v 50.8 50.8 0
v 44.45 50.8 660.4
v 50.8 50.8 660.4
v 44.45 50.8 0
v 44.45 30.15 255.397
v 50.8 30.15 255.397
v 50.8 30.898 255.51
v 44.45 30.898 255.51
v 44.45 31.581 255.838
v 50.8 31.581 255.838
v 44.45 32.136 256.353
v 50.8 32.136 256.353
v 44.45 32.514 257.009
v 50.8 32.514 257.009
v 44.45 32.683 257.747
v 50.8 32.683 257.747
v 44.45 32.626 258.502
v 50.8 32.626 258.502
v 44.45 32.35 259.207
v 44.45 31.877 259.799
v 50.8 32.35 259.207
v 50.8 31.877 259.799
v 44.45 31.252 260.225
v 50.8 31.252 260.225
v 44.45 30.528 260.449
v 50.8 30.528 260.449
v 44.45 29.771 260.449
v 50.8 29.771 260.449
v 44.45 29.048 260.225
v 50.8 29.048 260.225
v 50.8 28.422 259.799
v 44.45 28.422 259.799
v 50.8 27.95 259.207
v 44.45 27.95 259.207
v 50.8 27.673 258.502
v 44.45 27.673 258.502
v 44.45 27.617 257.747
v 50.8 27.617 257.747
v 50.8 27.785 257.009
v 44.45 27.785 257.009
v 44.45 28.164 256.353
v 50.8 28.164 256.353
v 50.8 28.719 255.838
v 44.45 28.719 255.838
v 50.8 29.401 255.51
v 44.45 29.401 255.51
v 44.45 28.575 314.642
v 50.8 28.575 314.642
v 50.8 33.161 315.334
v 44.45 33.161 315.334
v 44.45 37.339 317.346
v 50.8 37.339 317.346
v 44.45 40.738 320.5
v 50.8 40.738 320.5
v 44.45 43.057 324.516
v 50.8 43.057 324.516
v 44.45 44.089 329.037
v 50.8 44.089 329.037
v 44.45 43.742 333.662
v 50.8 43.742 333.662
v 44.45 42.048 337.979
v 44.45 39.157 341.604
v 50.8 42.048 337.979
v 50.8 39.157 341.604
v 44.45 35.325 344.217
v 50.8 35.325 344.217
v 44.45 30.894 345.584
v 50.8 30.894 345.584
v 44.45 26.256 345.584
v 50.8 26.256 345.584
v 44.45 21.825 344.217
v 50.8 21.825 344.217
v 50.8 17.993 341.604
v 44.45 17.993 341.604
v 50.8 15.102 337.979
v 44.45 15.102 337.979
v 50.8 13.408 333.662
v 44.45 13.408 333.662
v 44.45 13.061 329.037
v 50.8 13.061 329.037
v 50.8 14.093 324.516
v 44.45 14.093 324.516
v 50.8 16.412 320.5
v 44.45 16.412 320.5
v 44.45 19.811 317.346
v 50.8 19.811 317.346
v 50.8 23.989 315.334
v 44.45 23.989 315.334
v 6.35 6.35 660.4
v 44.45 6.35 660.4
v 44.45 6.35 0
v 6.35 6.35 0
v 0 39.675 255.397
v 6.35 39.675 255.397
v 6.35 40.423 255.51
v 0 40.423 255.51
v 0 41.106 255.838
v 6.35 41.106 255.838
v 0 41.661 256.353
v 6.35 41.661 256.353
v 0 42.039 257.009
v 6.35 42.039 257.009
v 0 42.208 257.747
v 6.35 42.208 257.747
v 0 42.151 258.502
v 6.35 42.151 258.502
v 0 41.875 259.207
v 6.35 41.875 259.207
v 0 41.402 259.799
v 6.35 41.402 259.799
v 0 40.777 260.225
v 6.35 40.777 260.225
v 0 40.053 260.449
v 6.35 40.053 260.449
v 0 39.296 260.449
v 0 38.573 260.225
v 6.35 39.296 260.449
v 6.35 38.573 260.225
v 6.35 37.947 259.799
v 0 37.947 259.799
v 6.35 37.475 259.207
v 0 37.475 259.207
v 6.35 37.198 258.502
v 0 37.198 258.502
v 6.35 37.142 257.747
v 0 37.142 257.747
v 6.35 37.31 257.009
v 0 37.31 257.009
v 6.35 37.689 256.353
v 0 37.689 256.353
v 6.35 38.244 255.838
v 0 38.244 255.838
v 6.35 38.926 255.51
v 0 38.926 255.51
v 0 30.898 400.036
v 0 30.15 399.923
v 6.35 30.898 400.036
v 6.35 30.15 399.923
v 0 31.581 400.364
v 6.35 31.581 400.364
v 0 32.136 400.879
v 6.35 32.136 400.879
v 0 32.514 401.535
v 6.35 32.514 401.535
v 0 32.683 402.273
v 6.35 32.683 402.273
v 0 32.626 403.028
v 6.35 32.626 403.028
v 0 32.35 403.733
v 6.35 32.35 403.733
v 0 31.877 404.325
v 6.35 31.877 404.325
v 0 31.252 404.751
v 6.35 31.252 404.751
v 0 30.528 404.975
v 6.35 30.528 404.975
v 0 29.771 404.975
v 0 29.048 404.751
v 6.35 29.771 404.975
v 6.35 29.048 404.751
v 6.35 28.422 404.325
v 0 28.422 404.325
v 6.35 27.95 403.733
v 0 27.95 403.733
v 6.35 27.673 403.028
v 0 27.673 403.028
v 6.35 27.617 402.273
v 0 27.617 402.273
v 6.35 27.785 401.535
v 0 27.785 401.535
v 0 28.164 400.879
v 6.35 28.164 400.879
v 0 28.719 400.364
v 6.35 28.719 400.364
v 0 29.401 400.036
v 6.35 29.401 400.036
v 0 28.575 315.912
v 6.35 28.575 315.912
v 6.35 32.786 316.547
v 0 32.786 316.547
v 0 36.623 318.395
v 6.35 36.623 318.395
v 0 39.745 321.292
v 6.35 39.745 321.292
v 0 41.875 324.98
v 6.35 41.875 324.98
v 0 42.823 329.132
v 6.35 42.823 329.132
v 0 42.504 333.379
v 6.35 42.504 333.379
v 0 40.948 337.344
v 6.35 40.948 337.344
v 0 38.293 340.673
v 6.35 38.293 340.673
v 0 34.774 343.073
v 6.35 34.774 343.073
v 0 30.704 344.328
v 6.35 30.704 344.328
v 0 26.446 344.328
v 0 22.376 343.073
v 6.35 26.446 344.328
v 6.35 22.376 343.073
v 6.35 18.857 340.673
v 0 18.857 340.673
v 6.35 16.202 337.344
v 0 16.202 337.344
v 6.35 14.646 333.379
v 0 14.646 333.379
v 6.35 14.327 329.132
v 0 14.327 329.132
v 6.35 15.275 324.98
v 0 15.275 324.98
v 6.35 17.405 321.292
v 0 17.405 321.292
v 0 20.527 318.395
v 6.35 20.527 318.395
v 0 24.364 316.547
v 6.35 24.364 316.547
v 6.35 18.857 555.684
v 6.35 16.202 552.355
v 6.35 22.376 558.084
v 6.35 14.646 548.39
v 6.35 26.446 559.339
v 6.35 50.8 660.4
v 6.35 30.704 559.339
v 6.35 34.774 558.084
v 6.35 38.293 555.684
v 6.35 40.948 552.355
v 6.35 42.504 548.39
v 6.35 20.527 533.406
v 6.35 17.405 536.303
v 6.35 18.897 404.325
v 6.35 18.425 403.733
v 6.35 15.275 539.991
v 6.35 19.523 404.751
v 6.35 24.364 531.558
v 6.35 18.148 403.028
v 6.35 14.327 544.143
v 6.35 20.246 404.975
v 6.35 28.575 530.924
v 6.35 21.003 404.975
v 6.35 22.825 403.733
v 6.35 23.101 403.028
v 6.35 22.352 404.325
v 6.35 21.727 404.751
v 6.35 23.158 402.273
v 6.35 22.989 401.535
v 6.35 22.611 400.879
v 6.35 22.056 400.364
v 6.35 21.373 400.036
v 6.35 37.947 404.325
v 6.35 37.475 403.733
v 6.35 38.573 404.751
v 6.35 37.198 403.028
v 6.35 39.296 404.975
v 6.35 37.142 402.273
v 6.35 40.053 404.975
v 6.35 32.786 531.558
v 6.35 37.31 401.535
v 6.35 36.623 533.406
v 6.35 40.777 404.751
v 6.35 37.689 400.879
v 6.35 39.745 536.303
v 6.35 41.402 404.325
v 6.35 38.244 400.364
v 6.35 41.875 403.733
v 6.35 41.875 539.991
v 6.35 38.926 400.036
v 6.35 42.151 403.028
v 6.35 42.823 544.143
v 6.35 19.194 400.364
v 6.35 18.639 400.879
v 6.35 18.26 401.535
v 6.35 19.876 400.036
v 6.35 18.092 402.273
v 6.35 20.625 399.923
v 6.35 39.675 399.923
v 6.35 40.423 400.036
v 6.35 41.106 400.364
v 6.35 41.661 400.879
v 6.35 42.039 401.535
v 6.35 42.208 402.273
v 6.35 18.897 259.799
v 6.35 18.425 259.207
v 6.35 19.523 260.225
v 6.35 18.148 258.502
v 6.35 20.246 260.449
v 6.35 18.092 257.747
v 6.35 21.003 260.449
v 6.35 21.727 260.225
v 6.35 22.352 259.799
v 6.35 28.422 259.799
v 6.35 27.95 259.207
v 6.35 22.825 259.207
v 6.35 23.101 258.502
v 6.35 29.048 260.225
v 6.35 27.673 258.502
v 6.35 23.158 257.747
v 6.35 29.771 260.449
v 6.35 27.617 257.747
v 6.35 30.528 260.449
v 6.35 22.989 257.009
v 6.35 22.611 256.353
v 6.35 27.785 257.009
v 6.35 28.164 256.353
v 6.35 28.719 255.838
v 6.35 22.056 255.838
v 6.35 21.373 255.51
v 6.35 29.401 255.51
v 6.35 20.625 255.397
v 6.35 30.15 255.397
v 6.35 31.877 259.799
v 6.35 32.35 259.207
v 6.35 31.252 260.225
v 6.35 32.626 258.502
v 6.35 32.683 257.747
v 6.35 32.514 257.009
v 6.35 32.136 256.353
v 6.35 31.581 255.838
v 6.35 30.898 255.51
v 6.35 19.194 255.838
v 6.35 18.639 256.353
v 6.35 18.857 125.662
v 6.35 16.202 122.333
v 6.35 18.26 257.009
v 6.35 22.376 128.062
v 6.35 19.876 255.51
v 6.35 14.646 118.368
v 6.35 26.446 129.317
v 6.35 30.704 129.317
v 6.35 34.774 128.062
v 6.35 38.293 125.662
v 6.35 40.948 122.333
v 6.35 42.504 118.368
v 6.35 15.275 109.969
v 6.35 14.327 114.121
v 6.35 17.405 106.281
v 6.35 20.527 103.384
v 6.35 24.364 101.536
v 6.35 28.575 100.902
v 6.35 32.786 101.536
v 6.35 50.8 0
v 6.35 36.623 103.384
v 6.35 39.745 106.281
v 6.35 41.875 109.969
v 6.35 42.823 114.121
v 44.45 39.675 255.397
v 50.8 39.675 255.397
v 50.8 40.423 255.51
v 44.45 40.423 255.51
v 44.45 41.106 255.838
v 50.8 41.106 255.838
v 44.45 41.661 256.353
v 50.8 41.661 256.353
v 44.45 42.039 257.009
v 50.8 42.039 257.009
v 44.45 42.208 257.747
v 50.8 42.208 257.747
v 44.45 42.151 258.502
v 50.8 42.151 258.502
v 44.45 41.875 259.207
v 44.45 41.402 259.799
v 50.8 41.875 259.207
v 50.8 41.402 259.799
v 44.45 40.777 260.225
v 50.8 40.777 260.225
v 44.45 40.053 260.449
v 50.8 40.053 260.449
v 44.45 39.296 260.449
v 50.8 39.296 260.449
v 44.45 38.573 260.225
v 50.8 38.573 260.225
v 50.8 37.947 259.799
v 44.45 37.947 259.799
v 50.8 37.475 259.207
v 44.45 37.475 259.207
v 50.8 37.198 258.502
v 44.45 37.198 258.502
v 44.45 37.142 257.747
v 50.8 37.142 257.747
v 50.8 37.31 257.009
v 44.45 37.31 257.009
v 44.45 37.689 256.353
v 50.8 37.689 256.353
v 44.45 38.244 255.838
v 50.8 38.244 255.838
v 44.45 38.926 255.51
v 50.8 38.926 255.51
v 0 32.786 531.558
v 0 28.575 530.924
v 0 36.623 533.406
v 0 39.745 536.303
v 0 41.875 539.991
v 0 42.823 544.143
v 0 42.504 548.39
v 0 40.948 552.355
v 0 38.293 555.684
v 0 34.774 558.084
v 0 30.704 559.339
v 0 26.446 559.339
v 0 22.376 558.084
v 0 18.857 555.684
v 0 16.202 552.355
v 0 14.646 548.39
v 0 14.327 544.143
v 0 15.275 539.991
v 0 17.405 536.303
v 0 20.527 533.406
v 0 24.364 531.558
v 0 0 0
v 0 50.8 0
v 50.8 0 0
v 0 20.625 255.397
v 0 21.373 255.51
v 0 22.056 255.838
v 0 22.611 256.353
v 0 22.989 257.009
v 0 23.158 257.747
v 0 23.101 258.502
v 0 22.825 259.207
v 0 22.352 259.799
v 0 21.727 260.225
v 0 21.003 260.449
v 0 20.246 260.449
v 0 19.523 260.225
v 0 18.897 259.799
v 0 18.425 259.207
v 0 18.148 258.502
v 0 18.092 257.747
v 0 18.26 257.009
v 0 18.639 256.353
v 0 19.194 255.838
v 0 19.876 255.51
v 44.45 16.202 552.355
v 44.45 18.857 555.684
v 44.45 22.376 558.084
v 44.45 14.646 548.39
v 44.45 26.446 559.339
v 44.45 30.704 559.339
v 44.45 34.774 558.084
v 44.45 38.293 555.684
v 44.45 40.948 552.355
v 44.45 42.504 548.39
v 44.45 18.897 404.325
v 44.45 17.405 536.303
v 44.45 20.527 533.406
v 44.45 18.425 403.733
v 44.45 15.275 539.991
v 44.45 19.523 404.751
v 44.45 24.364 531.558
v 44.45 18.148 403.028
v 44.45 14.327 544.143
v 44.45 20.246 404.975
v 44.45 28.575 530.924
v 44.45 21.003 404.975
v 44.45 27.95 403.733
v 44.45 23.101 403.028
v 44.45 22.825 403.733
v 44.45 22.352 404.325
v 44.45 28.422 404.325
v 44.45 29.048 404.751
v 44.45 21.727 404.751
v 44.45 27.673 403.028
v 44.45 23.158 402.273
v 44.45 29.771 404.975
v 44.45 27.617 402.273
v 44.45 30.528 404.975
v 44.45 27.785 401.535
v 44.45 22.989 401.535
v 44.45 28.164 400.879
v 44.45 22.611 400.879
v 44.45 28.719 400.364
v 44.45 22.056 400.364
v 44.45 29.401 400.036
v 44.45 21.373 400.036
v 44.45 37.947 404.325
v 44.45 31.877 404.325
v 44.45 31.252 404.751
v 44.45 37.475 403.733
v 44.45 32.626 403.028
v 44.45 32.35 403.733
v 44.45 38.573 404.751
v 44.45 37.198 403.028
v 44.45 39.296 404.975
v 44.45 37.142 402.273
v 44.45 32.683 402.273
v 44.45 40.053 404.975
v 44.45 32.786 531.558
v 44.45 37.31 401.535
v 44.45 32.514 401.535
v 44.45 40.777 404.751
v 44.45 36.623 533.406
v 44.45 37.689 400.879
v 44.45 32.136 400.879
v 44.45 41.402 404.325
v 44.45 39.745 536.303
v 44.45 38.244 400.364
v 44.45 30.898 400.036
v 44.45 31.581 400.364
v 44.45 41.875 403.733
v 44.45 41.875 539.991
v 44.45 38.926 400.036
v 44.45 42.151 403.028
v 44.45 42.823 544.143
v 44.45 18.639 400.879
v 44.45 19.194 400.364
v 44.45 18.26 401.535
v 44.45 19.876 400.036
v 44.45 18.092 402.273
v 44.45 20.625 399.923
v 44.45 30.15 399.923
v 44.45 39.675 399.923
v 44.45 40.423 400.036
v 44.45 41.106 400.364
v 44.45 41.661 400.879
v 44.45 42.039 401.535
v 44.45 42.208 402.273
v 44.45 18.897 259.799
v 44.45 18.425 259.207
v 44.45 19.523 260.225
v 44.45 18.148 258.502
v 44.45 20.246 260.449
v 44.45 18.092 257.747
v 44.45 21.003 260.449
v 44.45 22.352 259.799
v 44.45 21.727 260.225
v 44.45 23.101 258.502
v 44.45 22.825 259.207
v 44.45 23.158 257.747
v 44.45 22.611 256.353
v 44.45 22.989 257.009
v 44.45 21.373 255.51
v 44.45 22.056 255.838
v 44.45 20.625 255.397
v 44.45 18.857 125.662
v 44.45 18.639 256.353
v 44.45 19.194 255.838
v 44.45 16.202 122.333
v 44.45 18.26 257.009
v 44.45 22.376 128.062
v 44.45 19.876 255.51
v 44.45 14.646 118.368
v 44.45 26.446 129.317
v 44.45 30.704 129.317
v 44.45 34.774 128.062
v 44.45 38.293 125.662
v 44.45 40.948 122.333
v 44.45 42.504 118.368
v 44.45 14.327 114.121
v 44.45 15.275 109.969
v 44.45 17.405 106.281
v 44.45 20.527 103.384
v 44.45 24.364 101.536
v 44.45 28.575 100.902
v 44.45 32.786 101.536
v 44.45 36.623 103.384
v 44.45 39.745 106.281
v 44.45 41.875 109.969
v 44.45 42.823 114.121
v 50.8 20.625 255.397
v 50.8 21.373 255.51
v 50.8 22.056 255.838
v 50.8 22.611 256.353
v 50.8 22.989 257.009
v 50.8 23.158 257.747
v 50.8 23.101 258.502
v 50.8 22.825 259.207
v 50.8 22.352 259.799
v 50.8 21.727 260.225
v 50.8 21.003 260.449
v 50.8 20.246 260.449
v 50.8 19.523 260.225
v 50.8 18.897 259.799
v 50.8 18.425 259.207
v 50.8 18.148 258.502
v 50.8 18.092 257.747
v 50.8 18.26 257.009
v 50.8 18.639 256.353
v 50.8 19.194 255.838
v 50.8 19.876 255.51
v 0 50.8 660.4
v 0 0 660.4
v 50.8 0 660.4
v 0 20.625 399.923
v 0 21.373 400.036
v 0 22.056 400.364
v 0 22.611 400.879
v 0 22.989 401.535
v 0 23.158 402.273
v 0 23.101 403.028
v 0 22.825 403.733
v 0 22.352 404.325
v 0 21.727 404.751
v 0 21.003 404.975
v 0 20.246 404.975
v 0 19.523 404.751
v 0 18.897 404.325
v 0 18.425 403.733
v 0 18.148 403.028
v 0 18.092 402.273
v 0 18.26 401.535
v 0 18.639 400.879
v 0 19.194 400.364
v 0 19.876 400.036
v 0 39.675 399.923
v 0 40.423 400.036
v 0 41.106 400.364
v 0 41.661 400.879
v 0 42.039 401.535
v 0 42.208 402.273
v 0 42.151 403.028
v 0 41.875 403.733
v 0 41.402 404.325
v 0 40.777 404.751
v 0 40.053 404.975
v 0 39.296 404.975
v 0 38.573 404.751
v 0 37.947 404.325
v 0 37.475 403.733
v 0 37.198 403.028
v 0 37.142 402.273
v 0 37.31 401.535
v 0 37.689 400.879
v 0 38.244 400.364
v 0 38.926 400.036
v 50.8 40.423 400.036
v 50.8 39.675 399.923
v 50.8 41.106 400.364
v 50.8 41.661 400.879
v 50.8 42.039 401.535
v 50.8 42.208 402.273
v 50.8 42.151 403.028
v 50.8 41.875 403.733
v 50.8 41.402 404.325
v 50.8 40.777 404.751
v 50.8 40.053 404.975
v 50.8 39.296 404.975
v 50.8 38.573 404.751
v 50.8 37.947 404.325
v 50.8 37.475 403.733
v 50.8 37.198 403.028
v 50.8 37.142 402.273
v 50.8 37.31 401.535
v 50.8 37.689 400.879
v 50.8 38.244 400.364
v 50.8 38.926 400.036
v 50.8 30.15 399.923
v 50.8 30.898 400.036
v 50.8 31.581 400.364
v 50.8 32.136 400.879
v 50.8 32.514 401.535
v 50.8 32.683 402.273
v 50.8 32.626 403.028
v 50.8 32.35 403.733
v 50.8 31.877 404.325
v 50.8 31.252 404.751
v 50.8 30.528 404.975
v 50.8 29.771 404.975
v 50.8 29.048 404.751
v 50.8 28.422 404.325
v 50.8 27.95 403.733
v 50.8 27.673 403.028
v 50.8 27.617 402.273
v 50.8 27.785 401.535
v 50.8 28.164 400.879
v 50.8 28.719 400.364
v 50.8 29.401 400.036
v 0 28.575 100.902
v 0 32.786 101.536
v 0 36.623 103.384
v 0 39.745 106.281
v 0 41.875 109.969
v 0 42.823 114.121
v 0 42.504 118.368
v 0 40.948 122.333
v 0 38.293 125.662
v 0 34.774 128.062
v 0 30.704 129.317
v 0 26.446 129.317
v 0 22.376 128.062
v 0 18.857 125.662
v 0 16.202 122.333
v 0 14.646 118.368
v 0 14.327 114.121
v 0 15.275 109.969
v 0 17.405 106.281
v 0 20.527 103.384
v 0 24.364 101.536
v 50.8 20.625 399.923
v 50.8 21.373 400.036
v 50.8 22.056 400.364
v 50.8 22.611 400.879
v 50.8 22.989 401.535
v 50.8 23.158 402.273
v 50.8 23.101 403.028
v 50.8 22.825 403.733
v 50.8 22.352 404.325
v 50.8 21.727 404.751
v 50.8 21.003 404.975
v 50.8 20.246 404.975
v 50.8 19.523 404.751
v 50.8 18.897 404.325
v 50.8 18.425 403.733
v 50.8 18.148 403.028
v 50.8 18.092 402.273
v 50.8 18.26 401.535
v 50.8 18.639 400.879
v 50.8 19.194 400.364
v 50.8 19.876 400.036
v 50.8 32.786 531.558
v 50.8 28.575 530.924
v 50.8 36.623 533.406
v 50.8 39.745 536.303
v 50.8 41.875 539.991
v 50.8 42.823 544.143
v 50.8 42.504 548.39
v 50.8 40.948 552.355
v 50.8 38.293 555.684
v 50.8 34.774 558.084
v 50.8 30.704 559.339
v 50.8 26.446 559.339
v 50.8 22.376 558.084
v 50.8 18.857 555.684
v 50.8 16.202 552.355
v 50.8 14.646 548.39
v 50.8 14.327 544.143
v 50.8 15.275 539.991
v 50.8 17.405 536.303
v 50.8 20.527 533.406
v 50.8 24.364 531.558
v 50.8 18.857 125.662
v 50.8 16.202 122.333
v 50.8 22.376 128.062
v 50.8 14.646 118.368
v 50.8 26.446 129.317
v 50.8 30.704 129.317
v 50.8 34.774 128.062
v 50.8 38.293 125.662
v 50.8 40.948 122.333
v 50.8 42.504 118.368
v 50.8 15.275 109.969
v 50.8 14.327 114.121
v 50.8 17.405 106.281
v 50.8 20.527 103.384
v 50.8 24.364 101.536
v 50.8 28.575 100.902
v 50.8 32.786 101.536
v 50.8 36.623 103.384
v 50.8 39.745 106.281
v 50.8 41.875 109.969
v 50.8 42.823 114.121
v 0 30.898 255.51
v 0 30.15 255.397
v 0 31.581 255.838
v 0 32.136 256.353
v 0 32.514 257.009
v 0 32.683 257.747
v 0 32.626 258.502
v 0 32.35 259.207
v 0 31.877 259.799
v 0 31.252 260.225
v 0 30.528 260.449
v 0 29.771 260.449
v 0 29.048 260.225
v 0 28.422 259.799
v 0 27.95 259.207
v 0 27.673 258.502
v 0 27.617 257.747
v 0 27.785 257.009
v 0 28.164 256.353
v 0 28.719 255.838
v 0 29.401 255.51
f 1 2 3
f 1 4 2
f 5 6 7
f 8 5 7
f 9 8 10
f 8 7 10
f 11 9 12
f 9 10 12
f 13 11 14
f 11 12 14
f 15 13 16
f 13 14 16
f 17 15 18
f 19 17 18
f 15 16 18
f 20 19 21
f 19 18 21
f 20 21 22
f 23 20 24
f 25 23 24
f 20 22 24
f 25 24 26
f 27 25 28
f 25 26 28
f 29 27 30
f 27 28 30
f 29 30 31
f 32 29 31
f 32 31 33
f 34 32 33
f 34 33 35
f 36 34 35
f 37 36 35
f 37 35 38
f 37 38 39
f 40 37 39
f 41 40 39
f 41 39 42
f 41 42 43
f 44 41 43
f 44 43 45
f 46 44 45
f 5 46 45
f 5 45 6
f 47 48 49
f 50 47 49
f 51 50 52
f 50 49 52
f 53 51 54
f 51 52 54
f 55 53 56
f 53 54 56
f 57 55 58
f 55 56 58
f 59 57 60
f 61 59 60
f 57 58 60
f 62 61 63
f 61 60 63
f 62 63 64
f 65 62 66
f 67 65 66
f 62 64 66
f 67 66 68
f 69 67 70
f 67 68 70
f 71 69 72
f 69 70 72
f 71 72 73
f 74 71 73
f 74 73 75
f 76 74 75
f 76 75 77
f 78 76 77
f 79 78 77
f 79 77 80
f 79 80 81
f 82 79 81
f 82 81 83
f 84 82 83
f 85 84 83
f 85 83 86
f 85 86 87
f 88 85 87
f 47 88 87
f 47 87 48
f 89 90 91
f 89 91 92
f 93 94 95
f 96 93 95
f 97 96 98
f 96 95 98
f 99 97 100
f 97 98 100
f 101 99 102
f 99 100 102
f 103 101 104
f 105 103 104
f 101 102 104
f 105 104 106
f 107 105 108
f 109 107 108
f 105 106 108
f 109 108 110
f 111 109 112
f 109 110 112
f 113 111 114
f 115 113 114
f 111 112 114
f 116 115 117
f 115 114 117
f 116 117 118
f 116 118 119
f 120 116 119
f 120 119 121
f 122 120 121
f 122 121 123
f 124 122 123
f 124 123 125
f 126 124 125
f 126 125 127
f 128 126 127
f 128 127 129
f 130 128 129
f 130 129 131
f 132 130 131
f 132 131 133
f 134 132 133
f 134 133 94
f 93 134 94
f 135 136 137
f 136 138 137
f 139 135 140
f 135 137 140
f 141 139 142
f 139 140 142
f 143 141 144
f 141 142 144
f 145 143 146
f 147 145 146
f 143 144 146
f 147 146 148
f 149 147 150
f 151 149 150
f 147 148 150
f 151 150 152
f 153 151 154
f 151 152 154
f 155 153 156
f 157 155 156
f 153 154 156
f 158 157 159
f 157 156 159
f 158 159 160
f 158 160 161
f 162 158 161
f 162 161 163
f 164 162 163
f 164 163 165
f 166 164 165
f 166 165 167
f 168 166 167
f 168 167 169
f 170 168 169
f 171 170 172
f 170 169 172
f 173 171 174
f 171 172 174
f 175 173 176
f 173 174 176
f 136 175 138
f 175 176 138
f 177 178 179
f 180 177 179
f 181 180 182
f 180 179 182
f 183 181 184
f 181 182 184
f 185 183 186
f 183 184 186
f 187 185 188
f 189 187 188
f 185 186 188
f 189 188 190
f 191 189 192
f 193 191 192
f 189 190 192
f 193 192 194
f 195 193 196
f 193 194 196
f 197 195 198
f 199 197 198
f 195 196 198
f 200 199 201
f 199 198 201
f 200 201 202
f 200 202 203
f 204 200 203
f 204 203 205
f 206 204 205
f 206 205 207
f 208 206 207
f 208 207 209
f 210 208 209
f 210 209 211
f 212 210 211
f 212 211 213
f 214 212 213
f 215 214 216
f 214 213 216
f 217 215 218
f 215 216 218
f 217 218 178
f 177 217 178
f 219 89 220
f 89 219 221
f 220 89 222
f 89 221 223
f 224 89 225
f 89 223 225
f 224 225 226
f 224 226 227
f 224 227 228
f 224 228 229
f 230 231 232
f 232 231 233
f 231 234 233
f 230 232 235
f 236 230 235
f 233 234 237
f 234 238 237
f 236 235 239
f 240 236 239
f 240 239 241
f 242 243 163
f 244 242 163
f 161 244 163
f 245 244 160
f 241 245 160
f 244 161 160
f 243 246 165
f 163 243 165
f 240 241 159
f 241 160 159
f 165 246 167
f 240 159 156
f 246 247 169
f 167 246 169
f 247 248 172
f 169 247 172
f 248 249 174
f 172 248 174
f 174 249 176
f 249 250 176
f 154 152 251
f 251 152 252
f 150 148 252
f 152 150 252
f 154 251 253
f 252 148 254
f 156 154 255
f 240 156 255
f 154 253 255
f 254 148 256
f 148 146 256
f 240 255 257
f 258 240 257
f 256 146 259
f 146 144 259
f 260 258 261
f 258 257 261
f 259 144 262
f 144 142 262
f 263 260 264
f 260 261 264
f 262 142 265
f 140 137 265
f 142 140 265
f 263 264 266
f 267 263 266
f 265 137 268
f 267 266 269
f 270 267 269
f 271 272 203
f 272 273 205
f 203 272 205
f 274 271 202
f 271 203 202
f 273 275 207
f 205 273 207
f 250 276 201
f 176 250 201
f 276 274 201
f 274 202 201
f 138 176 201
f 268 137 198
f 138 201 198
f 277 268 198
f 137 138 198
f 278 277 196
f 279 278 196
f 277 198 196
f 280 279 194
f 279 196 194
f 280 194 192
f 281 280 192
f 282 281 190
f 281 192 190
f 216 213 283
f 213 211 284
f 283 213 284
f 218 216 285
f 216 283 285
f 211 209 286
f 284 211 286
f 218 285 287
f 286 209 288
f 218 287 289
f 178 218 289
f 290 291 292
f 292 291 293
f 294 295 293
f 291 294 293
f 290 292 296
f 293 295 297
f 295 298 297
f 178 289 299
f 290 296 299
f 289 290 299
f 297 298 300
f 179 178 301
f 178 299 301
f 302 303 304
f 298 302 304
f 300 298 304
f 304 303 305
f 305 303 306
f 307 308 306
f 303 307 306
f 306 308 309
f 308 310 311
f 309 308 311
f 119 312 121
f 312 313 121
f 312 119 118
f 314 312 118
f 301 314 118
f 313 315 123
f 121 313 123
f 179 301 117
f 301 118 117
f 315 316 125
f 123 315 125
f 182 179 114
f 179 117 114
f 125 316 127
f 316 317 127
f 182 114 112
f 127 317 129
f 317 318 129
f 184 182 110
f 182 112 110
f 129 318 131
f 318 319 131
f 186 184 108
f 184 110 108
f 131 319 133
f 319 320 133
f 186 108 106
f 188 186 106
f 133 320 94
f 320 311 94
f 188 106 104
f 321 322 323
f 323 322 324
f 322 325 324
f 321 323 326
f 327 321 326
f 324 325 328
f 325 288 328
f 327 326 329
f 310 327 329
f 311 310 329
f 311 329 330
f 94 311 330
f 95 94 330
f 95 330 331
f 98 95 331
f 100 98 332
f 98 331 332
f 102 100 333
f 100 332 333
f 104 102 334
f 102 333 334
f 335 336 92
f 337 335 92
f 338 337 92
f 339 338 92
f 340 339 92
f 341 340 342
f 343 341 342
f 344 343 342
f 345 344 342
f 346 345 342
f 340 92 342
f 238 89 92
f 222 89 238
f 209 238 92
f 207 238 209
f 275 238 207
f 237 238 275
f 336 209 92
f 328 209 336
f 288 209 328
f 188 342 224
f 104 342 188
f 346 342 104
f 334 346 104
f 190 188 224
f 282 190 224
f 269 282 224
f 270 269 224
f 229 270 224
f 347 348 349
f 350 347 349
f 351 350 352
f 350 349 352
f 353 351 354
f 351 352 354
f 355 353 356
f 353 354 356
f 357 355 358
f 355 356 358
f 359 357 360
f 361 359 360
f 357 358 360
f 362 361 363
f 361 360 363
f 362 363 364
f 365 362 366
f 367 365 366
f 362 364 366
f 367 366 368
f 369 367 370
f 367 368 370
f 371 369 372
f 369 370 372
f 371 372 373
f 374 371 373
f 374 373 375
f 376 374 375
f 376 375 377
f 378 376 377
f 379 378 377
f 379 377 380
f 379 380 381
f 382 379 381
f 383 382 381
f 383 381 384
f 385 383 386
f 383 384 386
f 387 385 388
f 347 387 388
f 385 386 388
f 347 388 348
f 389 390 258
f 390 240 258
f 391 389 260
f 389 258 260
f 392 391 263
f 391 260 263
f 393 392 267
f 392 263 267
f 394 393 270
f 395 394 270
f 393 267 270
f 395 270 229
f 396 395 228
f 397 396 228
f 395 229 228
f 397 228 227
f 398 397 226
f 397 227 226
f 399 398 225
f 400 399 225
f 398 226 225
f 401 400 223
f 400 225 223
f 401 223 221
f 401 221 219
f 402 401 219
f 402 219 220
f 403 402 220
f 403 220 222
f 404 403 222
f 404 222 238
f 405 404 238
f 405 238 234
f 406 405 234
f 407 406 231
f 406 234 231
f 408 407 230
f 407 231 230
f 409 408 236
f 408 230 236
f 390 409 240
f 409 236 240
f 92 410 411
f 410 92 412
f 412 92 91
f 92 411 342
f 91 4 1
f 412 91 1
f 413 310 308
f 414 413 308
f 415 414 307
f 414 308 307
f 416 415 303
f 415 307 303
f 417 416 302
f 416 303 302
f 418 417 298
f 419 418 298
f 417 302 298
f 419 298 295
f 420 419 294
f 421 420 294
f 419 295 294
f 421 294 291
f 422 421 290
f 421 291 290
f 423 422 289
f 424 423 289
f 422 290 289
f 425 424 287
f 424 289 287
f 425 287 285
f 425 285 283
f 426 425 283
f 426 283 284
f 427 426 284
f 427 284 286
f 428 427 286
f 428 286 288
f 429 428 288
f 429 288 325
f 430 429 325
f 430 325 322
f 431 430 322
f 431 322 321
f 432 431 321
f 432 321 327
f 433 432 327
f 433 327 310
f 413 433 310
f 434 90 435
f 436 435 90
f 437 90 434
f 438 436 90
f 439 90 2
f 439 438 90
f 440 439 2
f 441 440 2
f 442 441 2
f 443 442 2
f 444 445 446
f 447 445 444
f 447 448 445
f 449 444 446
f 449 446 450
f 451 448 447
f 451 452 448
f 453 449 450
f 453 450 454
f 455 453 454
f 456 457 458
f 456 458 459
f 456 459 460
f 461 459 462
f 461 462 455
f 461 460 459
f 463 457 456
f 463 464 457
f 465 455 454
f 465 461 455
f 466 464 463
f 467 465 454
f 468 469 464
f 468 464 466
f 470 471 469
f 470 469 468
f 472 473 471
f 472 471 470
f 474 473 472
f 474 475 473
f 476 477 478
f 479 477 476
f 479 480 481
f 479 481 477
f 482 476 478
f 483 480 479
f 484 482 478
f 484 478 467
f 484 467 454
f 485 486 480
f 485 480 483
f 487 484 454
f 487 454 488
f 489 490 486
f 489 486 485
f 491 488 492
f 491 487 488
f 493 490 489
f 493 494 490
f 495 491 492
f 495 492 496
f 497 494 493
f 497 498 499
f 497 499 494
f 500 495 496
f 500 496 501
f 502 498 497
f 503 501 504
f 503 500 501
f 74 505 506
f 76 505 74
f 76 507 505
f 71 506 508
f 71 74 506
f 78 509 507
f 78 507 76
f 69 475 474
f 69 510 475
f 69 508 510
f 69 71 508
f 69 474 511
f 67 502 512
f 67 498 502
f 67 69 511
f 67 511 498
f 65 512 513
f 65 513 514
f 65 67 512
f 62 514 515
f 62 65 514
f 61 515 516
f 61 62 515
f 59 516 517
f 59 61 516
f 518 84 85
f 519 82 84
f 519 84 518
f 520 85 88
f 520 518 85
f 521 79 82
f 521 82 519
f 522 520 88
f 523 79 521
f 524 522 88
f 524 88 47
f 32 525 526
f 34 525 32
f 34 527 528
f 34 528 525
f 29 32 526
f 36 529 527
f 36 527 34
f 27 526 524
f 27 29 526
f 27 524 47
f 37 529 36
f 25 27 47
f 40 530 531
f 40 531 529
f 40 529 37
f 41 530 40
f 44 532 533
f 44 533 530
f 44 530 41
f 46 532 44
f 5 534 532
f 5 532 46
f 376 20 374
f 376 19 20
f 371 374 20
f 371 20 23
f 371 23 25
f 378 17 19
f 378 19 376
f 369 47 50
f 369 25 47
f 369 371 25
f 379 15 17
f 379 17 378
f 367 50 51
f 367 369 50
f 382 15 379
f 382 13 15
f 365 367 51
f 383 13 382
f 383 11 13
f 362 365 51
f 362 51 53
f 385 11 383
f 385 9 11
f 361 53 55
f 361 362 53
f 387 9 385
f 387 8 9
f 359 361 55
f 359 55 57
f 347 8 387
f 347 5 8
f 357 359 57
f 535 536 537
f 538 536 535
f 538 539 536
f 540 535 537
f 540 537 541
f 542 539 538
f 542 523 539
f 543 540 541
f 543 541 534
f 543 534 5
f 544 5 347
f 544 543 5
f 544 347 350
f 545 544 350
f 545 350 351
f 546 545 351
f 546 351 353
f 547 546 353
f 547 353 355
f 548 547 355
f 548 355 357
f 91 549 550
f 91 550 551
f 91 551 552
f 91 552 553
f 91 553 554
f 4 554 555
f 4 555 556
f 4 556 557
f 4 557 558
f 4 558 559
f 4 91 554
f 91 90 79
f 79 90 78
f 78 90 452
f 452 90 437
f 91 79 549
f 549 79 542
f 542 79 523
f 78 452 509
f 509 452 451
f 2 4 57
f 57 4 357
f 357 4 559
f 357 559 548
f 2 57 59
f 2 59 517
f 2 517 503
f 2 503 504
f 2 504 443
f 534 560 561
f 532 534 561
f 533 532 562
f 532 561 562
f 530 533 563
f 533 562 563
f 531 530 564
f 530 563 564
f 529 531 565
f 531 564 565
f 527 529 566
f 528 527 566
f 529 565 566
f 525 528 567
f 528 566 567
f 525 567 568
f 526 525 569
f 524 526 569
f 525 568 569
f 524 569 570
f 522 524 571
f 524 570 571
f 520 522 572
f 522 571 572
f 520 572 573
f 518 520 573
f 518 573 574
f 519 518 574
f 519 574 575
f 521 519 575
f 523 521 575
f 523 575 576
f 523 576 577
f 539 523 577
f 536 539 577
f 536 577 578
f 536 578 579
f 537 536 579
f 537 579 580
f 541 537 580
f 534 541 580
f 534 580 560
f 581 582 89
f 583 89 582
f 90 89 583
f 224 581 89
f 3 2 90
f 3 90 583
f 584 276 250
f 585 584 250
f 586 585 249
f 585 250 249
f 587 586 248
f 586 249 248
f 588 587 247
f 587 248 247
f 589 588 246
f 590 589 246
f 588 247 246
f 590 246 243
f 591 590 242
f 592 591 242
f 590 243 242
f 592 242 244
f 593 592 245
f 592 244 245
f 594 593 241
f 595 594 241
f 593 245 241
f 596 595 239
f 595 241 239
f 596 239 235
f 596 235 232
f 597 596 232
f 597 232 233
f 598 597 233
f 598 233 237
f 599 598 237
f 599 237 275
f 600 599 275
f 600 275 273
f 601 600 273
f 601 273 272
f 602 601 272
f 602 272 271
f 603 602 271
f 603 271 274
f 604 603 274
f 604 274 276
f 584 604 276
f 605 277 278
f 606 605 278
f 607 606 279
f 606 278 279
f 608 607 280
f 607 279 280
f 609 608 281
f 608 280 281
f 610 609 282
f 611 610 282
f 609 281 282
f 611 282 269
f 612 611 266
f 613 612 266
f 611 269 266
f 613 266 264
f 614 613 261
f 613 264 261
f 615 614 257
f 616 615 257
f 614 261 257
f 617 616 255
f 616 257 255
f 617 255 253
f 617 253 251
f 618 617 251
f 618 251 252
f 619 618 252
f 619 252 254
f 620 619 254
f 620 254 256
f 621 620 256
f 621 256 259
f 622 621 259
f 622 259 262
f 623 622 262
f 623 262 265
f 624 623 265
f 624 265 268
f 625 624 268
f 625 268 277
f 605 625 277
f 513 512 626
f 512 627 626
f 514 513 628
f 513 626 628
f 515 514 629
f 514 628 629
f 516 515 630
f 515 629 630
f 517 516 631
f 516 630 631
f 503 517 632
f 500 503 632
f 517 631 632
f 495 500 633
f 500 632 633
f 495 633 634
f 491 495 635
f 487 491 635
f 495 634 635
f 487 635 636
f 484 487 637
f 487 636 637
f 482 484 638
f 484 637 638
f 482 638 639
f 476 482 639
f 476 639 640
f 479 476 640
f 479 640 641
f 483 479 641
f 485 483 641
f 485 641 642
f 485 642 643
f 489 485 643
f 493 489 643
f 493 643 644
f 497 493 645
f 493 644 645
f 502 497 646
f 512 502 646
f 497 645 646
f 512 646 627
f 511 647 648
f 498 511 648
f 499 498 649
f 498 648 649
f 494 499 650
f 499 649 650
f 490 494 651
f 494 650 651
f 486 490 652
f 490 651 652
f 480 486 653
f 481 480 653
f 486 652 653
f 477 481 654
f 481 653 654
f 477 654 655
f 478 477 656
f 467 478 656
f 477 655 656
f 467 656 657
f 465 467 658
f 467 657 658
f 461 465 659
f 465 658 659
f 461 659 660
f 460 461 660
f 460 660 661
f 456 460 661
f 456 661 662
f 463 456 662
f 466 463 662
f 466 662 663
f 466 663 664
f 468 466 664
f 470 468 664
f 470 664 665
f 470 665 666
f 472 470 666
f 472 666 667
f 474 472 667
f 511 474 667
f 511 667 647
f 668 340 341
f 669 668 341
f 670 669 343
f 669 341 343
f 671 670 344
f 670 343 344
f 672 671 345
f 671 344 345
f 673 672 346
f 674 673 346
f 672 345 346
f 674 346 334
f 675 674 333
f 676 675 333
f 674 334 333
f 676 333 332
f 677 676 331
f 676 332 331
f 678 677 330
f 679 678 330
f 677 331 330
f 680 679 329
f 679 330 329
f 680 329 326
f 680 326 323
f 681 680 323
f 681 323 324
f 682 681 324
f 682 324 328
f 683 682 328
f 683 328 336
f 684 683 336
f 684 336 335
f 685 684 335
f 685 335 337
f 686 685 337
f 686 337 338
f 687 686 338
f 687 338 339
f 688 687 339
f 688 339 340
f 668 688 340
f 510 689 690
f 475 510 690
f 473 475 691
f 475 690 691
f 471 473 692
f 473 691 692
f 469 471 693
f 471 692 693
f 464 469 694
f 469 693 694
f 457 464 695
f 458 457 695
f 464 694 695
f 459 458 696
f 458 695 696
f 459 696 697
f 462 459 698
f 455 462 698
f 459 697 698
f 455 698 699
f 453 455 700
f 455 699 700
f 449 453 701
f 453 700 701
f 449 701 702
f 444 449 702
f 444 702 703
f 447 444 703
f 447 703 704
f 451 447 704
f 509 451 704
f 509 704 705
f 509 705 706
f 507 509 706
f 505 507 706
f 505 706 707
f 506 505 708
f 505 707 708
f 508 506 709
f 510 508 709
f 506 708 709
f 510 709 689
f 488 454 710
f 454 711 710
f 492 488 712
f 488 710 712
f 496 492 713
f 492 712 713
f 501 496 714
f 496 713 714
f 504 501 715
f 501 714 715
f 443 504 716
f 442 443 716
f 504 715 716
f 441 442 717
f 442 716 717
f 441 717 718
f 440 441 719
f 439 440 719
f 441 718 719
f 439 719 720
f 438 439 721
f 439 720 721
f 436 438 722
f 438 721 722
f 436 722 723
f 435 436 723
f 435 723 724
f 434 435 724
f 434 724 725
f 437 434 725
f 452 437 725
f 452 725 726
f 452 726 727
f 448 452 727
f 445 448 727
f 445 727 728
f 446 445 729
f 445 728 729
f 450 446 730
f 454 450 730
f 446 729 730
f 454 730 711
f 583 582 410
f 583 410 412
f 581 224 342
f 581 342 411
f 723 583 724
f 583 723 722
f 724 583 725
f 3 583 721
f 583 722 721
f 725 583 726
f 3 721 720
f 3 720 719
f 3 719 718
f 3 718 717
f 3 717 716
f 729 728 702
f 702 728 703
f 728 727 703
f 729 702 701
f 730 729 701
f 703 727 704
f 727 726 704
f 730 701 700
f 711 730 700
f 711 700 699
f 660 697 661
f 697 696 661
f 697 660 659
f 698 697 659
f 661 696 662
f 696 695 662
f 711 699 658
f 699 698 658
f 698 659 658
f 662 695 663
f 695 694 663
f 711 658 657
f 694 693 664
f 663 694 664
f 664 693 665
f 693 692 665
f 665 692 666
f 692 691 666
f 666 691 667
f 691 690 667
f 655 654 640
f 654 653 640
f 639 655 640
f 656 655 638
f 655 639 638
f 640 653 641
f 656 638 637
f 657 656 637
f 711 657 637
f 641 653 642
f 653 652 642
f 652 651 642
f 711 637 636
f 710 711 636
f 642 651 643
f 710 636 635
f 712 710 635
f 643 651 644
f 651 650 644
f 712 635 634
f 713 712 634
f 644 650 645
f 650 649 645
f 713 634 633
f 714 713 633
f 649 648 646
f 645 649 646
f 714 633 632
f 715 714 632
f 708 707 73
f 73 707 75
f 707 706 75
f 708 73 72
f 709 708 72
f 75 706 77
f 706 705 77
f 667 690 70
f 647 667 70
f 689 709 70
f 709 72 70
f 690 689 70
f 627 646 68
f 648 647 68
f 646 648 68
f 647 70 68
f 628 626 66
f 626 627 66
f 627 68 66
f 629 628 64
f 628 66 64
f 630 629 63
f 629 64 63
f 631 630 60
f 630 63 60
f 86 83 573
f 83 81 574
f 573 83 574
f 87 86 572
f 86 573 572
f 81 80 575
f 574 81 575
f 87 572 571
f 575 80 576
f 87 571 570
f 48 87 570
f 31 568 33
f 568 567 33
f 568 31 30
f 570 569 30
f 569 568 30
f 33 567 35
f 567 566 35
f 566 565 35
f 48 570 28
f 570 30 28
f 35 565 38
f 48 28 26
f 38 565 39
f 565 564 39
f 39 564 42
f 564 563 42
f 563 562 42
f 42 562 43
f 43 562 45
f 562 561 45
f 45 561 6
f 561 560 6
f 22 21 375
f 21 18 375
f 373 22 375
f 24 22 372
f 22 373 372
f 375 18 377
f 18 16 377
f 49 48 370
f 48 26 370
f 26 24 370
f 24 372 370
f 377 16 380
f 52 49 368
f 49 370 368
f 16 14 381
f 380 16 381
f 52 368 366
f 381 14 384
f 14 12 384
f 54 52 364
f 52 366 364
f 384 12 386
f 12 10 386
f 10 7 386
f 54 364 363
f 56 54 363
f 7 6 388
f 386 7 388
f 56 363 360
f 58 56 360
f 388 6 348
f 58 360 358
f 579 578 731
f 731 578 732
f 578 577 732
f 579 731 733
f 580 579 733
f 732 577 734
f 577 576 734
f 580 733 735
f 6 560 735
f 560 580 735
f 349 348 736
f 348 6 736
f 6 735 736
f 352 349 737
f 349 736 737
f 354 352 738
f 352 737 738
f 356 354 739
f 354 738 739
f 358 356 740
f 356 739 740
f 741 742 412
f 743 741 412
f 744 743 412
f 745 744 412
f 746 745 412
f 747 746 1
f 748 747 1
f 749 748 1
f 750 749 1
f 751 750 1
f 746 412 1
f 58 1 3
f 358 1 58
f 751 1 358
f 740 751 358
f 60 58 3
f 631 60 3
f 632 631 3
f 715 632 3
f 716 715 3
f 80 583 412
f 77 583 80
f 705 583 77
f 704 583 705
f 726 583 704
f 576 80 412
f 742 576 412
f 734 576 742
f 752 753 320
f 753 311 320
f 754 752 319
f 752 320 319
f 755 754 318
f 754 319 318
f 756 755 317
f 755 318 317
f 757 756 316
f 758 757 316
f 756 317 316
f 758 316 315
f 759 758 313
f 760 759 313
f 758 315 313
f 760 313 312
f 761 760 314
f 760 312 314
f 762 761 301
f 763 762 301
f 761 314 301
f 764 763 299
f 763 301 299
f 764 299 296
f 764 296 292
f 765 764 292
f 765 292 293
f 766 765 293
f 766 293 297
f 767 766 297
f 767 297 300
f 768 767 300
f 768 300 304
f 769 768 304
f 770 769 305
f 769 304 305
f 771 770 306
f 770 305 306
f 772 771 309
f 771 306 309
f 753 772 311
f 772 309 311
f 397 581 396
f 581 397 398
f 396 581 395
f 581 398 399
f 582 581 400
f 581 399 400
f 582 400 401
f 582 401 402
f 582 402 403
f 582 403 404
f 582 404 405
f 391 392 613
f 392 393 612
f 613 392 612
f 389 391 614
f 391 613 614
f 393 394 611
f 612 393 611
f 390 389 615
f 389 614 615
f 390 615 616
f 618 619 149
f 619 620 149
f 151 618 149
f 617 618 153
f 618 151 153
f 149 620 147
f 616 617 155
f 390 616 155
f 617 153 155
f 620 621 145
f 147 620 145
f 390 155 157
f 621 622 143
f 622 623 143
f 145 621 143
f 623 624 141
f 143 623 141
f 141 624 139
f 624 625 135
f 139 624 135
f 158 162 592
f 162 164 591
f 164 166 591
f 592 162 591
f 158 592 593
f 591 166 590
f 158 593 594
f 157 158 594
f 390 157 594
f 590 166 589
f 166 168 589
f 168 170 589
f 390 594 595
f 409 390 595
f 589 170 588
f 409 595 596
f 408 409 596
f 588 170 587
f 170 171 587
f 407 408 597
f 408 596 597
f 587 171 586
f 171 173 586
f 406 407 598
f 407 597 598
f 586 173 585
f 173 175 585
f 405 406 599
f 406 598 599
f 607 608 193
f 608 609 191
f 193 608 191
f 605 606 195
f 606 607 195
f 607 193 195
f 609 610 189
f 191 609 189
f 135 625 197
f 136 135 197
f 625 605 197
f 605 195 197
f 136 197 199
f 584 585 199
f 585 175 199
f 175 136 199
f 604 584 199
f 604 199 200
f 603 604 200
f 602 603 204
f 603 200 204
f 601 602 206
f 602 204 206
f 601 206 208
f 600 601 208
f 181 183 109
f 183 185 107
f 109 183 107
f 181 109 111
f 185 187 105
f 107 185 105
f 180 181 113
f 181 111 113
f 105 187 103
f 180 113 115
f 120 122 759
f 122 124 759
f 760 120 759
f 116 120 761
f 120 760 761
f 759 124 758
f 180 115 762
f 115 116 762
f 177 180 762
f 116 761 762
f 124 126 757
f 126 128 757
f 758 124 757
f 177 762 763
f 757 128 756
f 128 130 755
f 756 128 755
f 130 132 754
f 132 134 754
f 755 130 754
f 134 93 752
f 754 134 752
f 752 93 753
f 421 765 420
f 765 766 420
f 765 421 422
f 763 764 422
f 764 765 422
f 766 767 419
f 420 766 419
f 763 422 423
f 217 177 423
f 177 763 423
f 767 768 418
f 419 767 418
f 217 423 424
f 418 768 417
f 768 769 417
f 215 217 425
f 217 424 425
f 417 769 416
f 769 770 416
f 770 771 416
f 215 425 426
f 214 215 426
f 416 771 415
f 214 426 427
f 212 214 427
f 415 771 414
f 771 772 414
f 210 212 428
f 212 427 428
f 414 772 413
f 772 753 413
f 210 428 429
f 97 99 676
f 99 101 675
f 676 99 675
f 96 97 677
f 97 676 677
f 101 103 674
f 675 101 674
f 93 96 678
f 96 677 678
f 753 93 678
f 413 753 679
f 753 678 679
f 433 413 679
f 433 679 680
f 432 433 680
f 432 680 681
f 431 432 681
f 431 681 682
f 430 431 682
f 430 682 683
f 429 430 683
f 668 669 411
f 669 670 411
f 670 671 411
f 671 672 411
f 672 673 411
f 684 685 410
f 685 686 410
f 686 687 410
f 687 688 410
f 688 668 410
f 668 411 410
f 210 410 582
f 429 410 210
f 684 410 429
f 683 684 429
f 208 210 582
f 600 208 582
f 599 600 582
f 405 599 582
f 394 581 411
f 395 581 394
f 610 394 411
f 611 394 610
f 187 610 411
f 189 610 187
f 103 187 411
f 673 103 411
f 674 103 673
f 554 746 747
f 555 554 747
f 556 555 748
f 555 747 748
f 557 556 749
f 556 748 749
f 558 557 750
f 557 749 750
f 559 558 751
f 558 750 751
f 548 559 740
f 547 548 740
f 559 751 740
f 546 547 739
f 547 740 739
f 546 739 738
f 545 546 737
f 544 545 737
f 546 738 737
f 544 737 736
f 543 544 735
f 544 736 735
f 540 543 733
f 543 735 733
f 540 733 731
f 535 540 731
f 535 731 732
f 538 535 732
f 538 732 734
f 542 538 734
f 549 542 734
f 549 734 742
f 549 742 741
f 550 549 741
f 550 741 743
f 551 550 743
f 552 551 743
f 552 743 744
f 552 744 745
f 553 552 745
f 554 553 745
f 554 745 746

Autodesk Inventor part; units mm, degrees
ref_plane "YZ Plane" through (0, 0, 0) normal (1, 0, 0) x (0, 1, 0)
ref_plane "XZ Plane" through (0, 0, 0) normal (0, 1, 0) x (-1, 0, 0)
ref_plane "XY Plane" through (0, 0, 0) normal (0, 0, 1) x (1, 0, 0)
sketch "Sketch1" plane through (0, 0, 0) normal (0, 0, 1) x (1, 0, 0)
  line L0 (0, 0) -> (6.35, 0)
  line L1 (6.35, 0) -> (6.35, 50.8)
  line L2 (6.35, 50.8) -> (0, 50.8)
  line L3 (0, 50.8) -> (0, 0)
  line L4 (0, 0) -> (50.8, 0)
  line L5 (50.8, 0) -> (50.8, 6.35)
  line L6 (50.8, 6.35) -> (0, 6.35)
  line L7 (0, 6.35) -> (0, 0)
  line L8 (50.8, 0) -> (44.45, 0)
  line L9 (44.45, 0) -> (44.45, 50.8)
  line L10 (44.45, 50.8) -> (50.8, 50.8)
  line L11 (50.8, 50.8) -> (50.8, 0)
  dimension "d0" = 6.35
  dimension "d1" = 50.8
  dimension "d2" = 50.8
  dimension "d3" = 6.35
  dimension "d4" = 6.35
extrude "Extrusion1" add sketch "Sketch1" along normal blind 660.4
sketch "Sketch2" plane through (50.8, 0, 0) normal (1, 0, 0) x (0, 0, -1)
  line L0 (0, 0) -> (0, 6.35)
  line L1 (0, 0) -> (0, 50.8) projected
  line L2 (0, 6.35) -> (-660.4, 6.35)
  line L3 (0, 0) -> (-660.4, 0) projected
  line L4 (0, 6.35) -> (0, 50.8) projected
  line L5 (0, 28.575) -> (-115.189, 28.575)
  circle A0 centre (-115.189, 28.575) radius 14.2875
  line L6 (-660.4, 6.35) -> (-660.4, 50.8) projected
  line L7 (-660.4, 28.575) -> (-545.211, 28.575)
  circle A1 centre (-545.211, 28.575) radius 14.2875
  line L8 (0, 50.8) -> (-660.4, 50.8) projected
  line L9 (-330.2, 50.8) -> (-330.2, 28.575)
  circle A2 centre (-330.2, 28.575) radius 14.2875
  dimension "d7" = 6.35
  dimension "d8" = 115.189
  dimension "d9" = 28.575
  dimension "d10" = 115.189
  dimension "d11" = 28.575
extrude "Extrusion2" cut sketch "Sketch2" against normal blind 660.4 contours A0 | A2 | A1
sketch "Sketch3" plane through (50.8, 0, 0) normal (1, 0, 0) x (0, 0, -1)
  circle A0 centre (-330.2, 28.575) radius 14.2875 projected
  circle A1 centre (-330.2, 28.575) radius 15.5575
  point P0 (0, 0)
  dimension "d14" = 31.115
extrude "Extrusion3" cut sketch "Sketch3" against normal blind 25.4
sketch "Sketch4" plane through (50.8, 0, 0) normal (1, 0, 0) x (0, 0, -1)
  circle A0 centre (-330.2, 28.575) radius 15.5575 projected
  line L0 (-330.2, 28.575) -> (-330.2, 50.8)
  line L1 (0, 50.8) -> (-660.4, 50.8) projected
  line L2 (-330.2, 50.8) -> (-402.463, 50.8)
  line L3 (-402.463, 50.8) -> (-402.463, 39.6748)
  line L4 (-402.463, 39.6748) -> (-402.463, 30.1498)
  line L5 (-402.463, 30.1498) -> (-402.463, 20.6248)
  line L6 (-330.2, 50.8) -> (-257.937, 50.8)
  line L7 (-257.937, 50.8) -> (-257.937, 39.6748)
  line L8 (-257.937, 39.6748) -> (-257.937, 30.1498)
  line L9 (-257.937, 30.1498) -> (-257.937, 20.6248)
  circle A1 centre (-402.463, 39.6748) radius 2.54
  circle A2 centre (-402.463, 30.1498) radius 2.54
  circle A3 centre (-402.463, 20.6248) radius 2.54
  circle A4 centre (-257.937, 39.6748) radius 2.54
  circle A5 centre (-257.937, 30.1498) radius 2.54
  circle A6 centre (-257.937, 20.6248) radius 2.54
  point P0 (0, 0)
  dimension "d17" = 72.263
  dimension "d18" = 11.1252
  dimension "d19" = 9.525
  dimension "d20" = 9.525
  dimension "d21" = 72.263
  dimension "d22" = 5.08
extrude "Extrusion4" cut sketch "Sketch4" against normal blind 84.1375 contours A3 | A2 L5 L4 | L4 L5 A2 | A1 L4 L3 | L3 L4 A1 | A6 | A5 L9 L8 | L8 L9 A5 | A4 L8 L7 | L7 L8 A4
properties part number "U" material "Aluminum 6061"
